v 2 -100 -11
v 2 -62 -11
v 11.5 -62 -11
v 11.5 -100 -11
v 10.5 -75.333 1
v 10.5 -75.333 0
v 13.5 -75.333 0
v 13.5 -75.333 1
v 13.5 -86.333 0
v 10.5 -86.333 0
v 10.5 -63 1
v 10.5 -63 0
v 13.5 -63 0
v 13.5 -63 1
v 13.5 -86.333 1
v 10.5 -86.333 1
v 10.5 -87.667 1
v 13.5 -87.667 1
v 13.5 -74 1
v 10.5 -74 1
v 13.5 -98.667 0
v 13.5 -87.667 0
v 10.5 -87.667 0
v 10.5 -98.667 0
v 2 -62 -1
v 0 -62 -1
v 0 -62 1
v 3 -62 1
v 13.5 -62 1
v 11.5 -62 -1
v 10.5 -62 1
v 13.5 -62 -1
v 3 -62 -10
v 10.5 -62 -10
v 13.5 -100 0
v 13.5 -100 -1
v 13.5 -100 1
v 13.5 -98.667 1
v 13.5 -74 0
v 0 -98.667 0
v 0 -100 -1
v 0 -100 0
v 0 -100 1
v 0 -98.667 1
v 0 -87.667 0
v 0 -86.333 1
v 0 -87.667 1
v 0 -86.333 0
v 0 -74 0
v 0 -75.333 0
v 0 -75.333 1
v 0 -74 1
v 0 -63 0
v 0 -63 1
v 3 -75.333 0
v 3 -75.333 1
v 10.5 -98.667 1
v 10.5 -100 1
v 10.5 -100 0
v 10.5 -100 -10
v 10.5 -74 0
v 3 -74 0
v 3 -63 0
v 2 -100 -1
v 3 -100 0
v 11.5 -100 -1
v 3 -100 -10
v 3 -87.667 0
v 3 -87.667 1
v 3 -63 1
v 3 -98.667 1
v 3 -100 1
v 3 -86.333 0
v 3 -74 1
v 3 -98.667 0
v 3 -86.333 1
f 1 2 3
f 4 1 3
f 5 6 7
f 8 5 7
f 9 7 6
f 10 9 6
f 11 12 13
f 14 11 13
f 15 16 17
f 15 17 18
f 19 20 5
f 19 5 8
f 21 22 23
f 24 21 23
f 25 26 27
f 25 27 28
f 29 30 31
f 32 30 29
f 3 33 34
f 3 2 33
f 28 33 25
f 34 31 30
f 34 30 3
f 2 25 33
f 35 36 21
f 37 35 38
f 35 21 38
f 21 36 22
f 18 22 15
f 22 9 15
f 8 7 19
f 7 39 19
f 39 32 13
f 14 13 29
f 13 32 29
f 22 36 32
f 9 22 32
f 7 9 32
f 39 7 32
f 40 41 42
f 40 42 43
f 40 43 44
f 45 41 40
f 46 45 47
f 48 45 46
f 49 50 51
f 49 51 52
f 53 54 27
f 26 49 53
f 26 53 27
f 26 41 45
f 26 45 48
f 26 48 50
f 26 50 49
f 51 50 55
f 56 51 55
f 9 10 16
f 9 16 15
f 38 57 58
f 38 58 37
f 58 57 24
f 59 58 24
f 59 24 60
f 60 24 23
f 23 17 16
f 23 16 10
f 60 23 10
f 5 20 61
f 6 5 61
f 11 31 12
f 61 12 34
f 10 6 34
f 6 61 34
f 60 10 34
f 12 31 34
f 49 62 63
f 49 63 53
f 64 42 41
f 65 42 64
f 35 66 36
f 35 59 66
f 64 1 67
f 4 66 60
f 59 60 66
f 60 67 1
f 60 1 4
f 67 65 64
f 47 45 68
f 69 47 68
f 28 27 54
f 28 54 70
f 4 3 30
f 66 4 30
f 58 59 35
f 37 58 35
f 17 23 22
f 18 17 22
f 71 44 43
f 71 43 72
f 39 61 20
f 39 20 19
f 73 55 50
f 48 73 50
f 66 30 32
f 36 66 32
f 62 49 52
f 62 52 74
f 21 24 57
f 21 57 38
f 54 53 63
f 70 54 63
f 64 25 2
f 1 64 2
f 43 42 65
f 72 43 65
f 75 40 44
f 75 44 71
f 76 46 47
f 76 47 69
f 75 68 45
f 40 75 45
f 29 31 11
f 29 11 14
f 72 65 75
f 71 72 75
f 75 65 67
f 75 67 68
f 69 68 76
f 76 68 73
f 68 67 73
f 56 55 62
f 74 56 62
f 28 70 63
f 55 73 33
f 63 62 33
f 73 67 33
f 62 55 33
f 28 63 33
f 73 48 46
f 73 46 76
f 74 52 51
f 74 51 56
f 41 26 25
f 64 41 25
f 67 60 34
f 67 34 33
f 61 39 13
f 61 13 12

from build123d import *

# Parameters (mm, degrees)
F1_DEPTH      = 100
F2_W          = 3
F2_H          = 1.333333
F2_H_2        = 1.333334
F3_DEPTH      = 1
F4_W          = 23.250002
F4_H          = 62
F5_DEPTH      = 1.001
F5_DEPTH_BACK = 11.001


with BuildPart() as f1:
    # F0 (on Front) → F1 (new body)
    with BuildSketch(Plane.XZ):
        Polygon((3, 0), (0, 0), (0, -1), (2, -1), (2, -11), (11.5, -11), (11.5, -1), (13.5, -1), (13.5, 0), (10.5, 0), (10.5, -10), (3, -10), align=None)
    extrude(amount=F1_DEPTH)

    # F2 (on face) → F3 (join)
    with BuildSketch(Plane.XY):
        with Locations((1.5, -0.666666)):
            Rectangle(F2_W, F2_H)
        with Locations((12, -0.666666)):
            Rectangle(F2_W, F2_H)
        with Locations((1.5, -13)):
            Rectangle(F2_W, F2_H_2)
        with Locations((12, -13)):
            Rectangle(F2_W, F2_H_2)
        with Locations((1.5, -25.333334)):
            Rectangle(F2_W, F2_H)
        with Locations((12, -25.333334)):
            Rectangle(F2_W, F2_H)
        with Locations((1.5, -37.666666)):
            Rectangle(F2_W, F2_H)
        with Locations((12, -37.666666)):
            Rectangle(F2_W, F2_H)
        with Locations((1.5, -50)):
            Rectangle(F2_W, F2_H_2)
        with Locations((12, -50)):
            Rectangle(F2_W, F2_H_2)
        with Locations((1.5, -62.333333)):
            Rectangle(F2_W, F2_H)
        with Locations((12, -62.333333)):
            Rectangle(F2_W, F2_H)
        with Locations((1.5, -74.666666)):
            Rectangle(F2_W, F2_H)
        with Locations((12, -74.666666)):
            Rectangle(F2_W, F2_H)
        with Locations((1.5, -87)):
            Rectangle(F2_W, F2_H_2)
        with Locations((12, -87)):
            Rectangle(F2_W, F2_H_2)
        with Locations((1.5, -99.333333)):
            Rectangle(F2_W, F2_H)
        with Locations((12, -99.333333)):
            Rectangle(F2_W, F2_H)
    extrude(amount=F3_DEPTH)

    # F4 (on Top) → F5 (cut, two sides)
    with BuildSketch(Plane.XY) as f5_sk:
        with Locations((11.625001, -31)):
            Rectangle(F4_W, F4_H)
    extrude(amount=F5_DEPTH, mode=Mode.SUBTRACT)
    extrude(f5_sk.sketch, amount=-F5_DEPTH_BACK, mode=Mode.SUBTRACT)


solid = f1.part
